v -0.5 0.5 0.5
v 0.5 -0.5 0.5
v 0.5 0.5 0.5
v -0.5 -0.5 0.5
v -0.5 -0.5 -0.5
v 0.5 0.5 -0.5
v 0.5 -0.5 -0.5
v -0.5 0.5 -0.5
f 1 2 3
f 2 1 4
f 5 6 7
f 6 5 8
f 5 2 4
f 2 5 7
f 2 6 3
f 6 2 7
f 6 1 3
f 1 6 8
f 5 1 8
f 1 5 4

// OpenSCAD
// file: ../../core/params.scad
// Shared parameter override helpers for transform operators.
//
// INPUT FORMAT (`params_overrides`)
// ---------------------------------
// `params_overrides` is a list of rows. Each row targets an element kind
// ("face" | "vert" | "edge"), a selector scope, and one or more key/value
// pairs.
//
// Row schemas:
//   ["face"|"vert"|"edge", "all", ["key", value], ...]
//   ["face"|"vert"|"edge", "family", family_id, ["key", value], ...]
//   ["face"|"vert"|"edge", "id", id_or_ids, ["key", value], ...]
//
// Where:
// - `id_or_ids` may be a single index or a list of indices.
// - keys are operator-defined (examples: "df", "angle", "c", "de", "t").
//
// Precedence is fixed and deterministic:
//   id > family > all
// For the same scope/key, later rows win.
// For duplicate keys in one row, the last key/value wins.
//
// EXAMPLE INPUT
// -------------
// rows = [
//   ["face", "all", ["angle", 15]],
//   ["face", "family", 1, ["df", 0.04]],
//   ["face", "id", [2, 7], ["angle", 19]],
//   ["vert", "family", 0, ["c", 0.06]]
// ];
//
// OUTPUT FORMAT (compiled arrays)
// --------------------------------
// `ps_params_compile_key(...)` returns a dense per-index array of length
// `count`, containing either a resolved value or `undef`.
//
// `ps_params_compile_specs(...)` returns a list of dense arrays, one per spec,
// in the same order as `specs`.
//
// Example:
// face_fid = [0, 1, 1, 0];
// face_df = ps_params_compile_key(rows, "face", "df", 4, face_fid);
// // => [undef, 0.04, 0.04, undef]
//
// face_angle = ps_params_compile_key(rows, "face", "angle", 4, face_fid);
// // => [15, 15, 19, 15]
//
// specs = [
//   ["face", "df", 4, face_fid],
//   ["face", "angle", 4, face_fid]
// ];
// compiled = ps_params_compile_specs(rows, specs);
// // => [face_df, face_angle]
//
// ACCESSOR USAGE
// --------------
// v = ps_compiled_param_get(compiled[0], face_idx); // safe bounds + undef
//
// DEBUG PRINT
// -----------
// Use `ps_params_print(rows);` to dump normalized row interpretation.

function _ps_params_row_kind(row) =
    (!is_list(row) || len(row) < 1) ? undef : row[0];

function _ps_params_row_scope(row) =
    (!is_list(row) || len(row) < 2) ? undef
        : (is_string(row[1]) && (row[1] == "all" || row[1] == "family" || row[1] == "id")) ? row[1]
        : undef;

function _ps_params_row_selector(row) =
    let(scope = _ps_params_row_scope(row))
    (scope == "all") ? undef
        : (scope == "family") ? row[2]
        : (scope == "id") ? row[2]
        : undef;

function _ps_params_row_kv_start(row) =
    let(scope = _ps_params_row_scope(row))
    (scope == "family" || scope == "id") ? 3
        : (scope == "all") ? 2
        : 999999;

function _ps_params_selector_has_id(selector, id) =
    is_undef(id) ? false
        : is_list(selector)
            ? (len([for (x = selector) if (x == id) 1]) > 0)
            : (selector == id);

function _ps_params_row_applies(row, kind, scope, element_id=undef, family_id=undef) =
    let(
        row_kind = _ps_params_row_kind(row),
        row_scope = _ps_params_row_scope(row),
        selector = _ps_params_row_selector(row)
    )
    (row_kind == kind) && (row_scope == scope) && (
        (scope == "all")
        || (scope == "family" && !is_undef(family_id) && selector == family_id)
        || (scope == "id" && _ps_params_selector_has_id(selector, element_id))
    );

function _ps_params_row_get(row, key) =
    let(
        start = _ps_params_row_kv_start(row),
        vals = [
            for (i = [start:1:len(row)-1])
                let(p = row[i])
                if (is_list(p) && len(p) >= 2 && p[0] == key) p[1]
        ],
        vals2 = [for (v = vals) if (!is_undef(v)) v]
    )
    (len(vals2) == 0) ? undef : vals2[len(vals2)-1];

function ps_params_get(params_overrides, kind, key, element_id=undef, family_id=undef) =
    let(
        rows = is_undef(params_overrides) ? [] : params_overrides,
        vals_all = [for (row = rows) if (_ps_params_row_applies(row, kind, "all", element_id, family_id)) _ps_params_row_get(row, key)],
        vals_family = [for (row = rows) if (_ps_params_row_applies(row, kind, "family", element_id, family_id)) _ps_params_row_get(row, key)],
        vals_id = [for (row = rows) if (_ps_params_row_applies(row, kind, "id", element_id, family_id)) _ps_params_row_get(row, key)],
        all2 = [for (v = vals_all) if (!is_undef(v)) v],
        fam2 = [for (v = vals_family) if (!is_undef(v)) v],
        id2 = [for (v = vals_id) if (!is_undef(v)) v],
        v_all = (len(all2) == 0) ? undef : all2[len(all2)-1],
        v_family = (len(fam2) == 0) ? undef : fam2[len(fam2)-1],
        v_id = (len(id2) == 0) ? undef : id2[len(id2)-1]
    )
    !is_undef(v_id) ? v_id
        : !is_undef(v_family) ? v_family
        : v_all;

function ps_params_count_kind(params_overrides, kind) =
    is_undef(params_overrides) ? 0
        : len([for (row = params_overrides) if (_ps_params_row_kind(row) == kind) 1]);

// Compile one kind/key into a dense lookup array, optionally using a parallel
// family-id array for family-scoped matches.
function ps_params_compile_key(params_overrides, kind, key, count, family_ids=undef) =
    [for (idx = [0:1:max(0, count-1)])
        ps_params_get(
            params_overrides,
            kind,
            key,
            idx,
            (is_undef(family_ids) || idx >= len(family_ids)) ? undef : family_ids[idx]
        )
    ];

// Compile multiple specs into dense lookup arrays.
// Spec row format:
//   [kind, key, count]
//   [kind, key, count, family_ids]
function ps_params_compile_specs(params_overrides, specs) =
    [for (spec = specs)
        ps_params_compile_key(
            params_overrides,
            spec[0],
            spec[1],
            spec[2],
            (len(spec) >= 4) ? spec[3] : undef
        )
    ];

function ps_compiled_param_get(arr, idx) =
    (is_undef(arr) || idx < 0 || idx >= len(arr)) ? undef : arr[idx];

module ps_params_print(params_overrides) {
    rows = is_undef(params_overrides) ? [] : params_overrides;
    echo(str("params_overrides: rows=", len(rows)));
    for (ri = [0:1:len(rows)-1]) {
        row = rows[ri];
        kind = _ps_params_row_kind(row);
        scope = _ps_params_row_scope(row);
        sel = _ps_params_row_selector(row);
        start = _ps_params_row_kv_start(row);
        kv = (start > len(row)-1) ? [] : [for (i = [start:1:len(row)-1]) row[i]];
        echo(str("  row#", ri, " kind=", kind, " scope=", scope, " selector=", sel, " kv=", kv));
    }
}
// main file
use <../../core/params.scad>

/*
Params-overrides basics example.

Shows that `face_fid` is a family-id array indexed by face index.
Here we use a synthetic 4-face case:

    face index:  0  1  2  3
    face_fid:   [0, 1, 1, 0]

Meaning:
- faces 0 and 3 belong to face family 0
- faces 1 and 2 belong to face family 1
*/

rows = [
    ["face", "all", ["angle", 15]],
    ["face", "family", 1, ["df", 0.04]],
    ["face", "id", [2, 3], ["angle", 19]],
    ["vert", "family", 0, ["c", 0.06]]
];

face_fid = [0, 1, 1, 0];

face_df = ps_params_compile_key(rows, "face", "df", 4, face_fid);
face_angle = ps_params_compile_key(rows, "face", "angle", 4, face_fid);

echo("params example: face_fid=", face_fid);
echo("params example: face_df=", face_df);         // [undef, 0.04, 0.04, undef]
echo("params example: face_angle=", face_angle);   // [15, 15, 19, 19]
ps_params_print(rows);

// Minimal geometry so this file renders to a valid STL target.
cube(1, center=true);
